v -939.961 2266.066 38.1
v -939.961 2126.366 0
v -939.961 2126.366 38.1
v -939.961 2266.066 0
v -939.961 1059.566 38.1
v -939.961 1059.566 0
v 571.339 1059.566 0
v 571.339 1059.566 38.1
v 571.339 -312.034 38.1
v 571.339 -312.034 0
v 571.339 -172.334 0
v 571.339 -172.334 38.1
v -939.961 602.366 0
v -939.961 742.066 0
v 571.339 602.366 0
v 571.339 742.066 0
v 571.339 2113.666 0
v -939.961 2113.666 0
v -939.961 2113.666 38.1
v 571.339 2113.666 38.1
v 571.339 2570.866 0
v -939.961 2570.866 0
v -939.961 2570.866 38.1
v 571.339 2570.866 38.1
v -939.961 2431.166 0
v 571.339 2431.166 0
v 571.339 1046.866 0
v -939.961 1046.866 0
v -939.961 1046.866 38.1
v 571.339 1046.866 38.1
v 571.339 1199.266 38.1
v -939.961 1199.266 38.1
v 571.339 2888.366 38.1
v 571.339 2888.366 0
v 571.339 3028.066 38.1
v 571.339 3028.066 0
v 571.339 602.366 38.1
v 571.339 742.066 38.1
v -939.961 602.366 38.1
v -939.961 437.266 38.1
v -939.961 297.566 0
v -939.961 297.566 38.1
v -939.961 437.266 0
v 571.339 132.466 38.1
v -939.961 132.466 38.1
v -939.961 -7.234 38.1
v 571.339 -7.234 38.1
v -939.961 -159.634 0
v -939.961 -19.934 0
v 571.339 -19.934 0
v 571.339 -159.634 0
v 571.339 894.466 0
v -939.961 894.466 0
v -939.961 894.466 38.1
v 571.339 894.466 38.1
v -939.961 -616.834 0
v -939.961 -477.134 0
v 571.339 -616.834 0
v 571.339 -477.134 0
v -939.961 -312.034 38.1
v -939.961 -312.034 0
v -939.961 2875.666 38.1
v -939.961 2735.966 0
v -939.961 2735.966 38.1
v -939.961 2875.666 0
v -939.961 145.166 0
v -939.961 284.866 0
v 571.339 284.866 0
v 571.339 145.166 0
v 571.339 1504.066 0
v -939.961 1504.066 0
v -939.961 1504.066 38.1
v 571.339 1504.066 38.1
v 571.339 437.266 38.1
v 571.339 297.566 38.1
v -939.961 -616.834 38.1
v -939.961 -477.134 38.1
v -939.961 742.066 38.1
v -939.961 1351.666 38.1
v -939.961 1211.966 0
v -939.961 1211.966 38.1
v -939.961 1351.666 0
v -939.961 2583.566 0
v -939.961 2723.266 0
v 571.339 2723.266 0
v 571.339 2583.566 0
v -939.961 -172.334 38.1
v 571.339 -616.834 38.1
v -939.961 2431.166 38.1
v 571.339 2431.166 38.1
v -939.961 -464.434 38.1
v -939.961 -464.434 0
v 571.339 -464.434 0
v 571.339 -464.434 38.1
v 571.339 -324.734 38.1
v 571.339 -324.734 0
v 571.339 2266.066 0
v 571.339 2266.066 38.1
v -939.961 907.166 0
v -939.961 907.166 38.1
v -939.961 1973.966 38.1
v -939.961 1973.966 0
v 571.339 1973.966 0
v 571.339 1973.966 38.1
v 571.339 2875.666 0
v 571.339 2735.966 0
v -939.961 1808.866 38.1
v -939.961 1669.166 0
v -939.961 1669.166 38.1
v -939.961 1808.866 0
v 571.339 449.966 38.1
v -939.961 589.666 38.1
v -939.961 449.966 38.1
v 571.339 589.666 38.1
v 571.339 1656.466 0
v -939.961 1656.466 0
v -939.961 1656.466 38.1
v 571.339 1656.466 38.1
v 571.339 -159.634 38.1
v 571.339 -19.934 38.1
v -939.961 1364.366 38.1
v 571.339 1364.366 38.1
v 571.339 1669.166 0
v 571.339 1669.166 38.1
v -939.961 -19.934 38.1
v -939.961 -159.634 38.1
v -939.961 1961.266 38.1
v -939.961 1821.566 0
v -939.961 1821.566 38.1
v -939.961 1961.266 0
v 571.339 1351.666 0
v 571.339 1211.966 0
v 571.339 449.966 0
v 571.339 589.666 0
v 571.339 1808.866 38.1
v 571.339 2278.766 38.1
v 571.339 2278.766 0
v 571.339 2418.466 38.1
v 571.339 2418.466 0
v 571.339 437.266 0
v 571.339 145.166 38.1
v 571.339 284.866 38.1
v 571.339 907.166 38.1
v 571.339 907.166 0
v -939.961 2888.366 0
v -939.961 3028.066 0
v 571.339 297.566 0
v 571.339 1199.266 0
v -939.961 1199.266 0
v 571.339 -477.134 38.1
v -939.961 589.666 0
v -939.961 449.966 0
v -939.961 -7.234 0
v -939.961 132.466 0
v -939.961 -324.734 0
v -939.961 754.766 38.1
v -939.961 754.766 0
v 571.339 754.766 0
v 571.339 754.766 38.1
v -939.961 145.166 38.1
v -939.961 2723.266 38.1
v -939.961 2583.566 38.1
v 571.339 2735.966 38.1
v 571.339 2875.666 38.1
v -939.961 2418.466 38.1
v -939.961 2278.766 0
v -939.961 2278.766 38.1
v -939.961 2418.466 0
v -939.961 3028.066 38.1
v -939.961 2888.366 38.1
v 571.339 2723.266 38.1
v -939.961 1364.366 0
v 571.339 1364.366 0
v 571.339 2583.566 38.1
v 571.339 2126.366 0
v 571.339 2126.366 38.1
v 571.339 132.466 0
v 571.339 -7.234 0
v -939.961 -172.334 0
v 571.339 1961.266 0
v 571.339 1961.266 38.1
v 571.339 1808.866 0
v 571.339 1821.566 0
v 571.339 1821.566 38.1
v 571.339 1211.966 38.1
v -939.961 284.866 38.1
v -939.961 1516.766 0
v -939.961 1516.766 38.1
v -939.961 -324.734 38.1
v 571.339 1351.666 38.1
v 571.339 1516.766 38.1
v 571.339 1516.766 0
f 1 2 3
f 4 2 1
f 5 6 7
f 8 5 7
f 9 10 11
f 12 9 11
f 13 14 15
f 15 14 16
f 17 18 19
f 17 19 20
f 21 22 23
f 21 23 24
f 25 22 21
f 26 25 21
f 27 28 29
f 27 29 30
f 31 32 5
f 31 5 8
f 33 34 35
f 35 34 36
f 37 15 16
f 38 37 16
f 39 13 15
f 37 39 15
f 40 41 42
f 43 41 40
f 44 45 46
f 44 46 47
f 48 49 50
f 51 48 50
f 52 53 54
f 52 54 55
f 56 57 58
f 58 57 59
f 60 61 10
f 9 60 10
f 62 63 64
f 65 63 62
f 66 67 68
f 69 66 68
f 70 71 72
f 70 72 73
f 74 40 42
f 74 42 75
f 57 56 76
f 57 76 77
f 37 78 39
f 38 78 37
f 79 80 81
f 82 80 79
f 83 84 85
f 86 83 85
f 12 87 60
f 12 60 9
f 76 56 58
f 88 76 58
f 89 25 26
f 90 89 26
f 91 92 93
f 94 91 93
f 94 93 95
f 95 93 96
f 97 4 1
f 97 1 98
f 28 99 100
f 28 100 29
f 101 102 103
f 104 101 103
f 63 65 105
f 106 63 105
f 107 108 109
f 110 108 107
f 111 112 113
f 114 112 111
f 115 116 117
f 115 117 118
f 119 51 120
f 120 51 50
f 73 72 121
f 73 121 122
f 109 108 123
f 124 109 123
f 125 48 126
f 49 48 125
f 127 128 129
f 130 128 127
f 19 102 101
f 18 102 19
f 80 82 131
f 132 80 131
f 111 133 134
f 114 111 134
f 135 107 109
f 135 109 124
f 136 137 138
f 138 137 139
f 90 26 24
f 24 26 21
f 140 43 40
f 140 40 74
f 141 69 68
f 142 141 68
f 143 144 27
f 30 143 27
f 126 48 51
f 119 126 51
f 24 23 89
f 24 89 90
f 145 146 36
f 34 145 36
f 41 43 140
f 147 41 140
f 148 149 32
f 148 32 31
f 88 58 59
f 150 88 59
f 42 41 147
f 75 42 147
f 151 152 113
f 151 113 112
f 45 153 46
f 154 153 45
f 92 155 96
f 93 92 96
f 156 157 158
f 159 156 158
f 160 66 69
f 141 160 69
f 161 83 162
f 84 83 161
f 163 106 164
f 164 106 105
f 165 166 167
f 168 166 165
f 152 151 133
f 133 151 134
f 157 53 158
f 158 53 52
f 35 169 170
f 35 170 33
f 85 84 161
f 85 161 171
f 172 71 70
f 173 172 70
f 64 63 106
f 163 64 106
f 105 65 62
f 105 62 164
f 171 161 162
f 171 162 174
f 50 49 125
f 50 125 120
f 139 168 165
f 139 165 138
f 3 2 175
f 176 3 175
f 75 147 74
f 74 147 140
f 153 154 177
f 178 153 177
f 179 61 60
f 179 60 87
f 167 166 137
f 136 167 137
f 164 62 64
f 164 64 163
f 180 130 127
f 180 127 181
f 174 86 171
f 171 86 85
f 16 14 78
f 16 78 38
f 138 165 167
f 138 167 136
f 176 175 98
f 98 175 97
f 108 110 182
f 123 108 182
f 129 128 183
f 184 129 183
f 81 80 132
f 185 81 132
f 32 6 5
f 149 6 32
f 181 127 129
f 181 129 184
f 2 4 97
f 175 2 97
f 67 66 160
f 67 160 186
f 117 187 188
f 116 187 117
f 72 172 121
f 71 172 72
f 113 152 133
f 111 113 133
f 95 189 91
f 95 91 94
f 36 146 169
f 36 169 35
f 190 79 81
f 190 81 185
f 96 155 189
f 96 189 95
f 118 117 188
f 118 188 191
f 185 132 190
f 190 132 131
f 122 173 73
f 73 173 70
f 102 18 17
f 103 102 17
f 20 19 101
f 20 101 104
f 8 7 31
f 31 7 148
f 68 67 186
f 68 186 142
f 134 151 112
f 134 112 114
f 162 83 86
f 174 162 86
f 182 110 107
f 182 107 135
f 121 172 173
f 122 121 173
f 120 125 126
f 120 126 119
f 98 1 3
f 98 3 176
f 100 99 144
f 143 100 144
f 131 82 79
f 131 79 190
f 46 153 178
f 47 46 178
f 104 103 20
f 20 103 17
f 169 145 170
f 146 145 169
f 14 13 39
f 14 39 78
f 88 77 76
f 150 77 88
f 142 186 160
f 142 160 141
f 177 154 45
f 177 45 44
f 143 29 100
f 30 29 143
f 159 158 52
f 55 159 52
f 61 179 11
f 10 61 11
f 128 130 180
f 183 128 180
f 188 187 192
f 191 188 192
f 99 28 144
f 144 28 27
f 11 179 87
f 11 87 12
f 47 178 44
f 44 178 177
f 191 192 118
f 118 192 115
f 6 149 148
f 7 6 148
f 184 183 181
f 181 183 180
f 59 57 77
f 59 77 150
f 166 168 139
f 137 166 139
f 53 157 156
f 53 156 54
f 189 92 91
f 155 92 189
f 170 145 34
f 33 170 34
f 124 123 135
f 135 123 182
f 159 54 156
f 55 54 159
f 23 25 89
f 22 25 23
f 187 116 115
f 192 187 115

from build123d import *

# Parameters (mm, degrees)
F0_W     = 1511.3
F0_H     = 139.7
F1_DEPTH = 38.1


with BuildPart() as f1:
    # F0 (on Top) → F1 (new body)
    with BuildSketch(Plane.XY):
        with Locations((-184.310764, -546.984147)):
            Rectangle(F0_W, F0_H)
        with Locations((-184.310764, -394.584147)):
            Rectangle(F0_W, F0_H)
        with Locations((-184.310764, -242.184147)):
            Rectangle(F0_W, F0_H)
        with Locations((-184.310764, -89.784147)):
            Rectangle(F0_W, F0_H)
        with Locations((-184.310764, 62.615853)):
            Rectangle(F0_W, F0_H)
        with Locations((-184.310764, 215.015853)):
            Rectangle(F0_W, F0_H)
        with Locations((-184.310764, 367.415853)):
            Rectangle(F0_W, F0_H)
        with Locations((-184.310764, 519.815853)):
            Rectangle(F0_W, F0_H)
        with Locations((-184.310764, 672.215853)):
            Rectangle(F0_W, F0_H)
        with Locations((-184.310764, 824.615853)):
            Rectangle(F0_W, F0_H)
        with Locations((-184.310764, 977.015853)):
            Rectangle(F0_W, F0_H)
        with Locations((-184.310764, 1129.415853)):
            Rectangle(F0_W, F0_H)
        with Locations((-184.310764, 1281.815853)):
            Rectangle(F0_W, F0_H)
        with Locations((-184.310764, 1434.215853)):
            Rectangle(F0_W, F0_H)
        with Locations((-184.310764, 1586.615853)):
            Rectangle(F0_W, F0_H)
        with Locations((-184.310764, 1739.015853)):
            Rectangle(F0_W, F0_H)
        with Locations((-184.310764, 1891.415853)):
            Rectangle(F0_W, F0_H)
        with Locations((-184.310764, 2043.815853)):
            Rectangle(F0_W, F0_H)
        with Locations((-184.310764, 2196.215853)):
            Rectangle(F0_W, F0_H)
        with Locations((-184.310764, 2348.615853)):
            Rectangle(F0_W, F0_H)
        with Locations((-184.310764, 2501.015853)):
            Rectangle(F0_W, F0_H)
        with Locations((-184.310764, 2653.415853)):
            Rectangle(F0_W, F0_H)
        with Locations((-184.310764, 2805.815853)):
            Rectangle(F0_W, F0_H)
        with Locations((-184.310764, 2958.215853)):
            Rectangle(F0_W, F0_H)
    extrude(amount=F1_DEPTH)


solid = f1.part
